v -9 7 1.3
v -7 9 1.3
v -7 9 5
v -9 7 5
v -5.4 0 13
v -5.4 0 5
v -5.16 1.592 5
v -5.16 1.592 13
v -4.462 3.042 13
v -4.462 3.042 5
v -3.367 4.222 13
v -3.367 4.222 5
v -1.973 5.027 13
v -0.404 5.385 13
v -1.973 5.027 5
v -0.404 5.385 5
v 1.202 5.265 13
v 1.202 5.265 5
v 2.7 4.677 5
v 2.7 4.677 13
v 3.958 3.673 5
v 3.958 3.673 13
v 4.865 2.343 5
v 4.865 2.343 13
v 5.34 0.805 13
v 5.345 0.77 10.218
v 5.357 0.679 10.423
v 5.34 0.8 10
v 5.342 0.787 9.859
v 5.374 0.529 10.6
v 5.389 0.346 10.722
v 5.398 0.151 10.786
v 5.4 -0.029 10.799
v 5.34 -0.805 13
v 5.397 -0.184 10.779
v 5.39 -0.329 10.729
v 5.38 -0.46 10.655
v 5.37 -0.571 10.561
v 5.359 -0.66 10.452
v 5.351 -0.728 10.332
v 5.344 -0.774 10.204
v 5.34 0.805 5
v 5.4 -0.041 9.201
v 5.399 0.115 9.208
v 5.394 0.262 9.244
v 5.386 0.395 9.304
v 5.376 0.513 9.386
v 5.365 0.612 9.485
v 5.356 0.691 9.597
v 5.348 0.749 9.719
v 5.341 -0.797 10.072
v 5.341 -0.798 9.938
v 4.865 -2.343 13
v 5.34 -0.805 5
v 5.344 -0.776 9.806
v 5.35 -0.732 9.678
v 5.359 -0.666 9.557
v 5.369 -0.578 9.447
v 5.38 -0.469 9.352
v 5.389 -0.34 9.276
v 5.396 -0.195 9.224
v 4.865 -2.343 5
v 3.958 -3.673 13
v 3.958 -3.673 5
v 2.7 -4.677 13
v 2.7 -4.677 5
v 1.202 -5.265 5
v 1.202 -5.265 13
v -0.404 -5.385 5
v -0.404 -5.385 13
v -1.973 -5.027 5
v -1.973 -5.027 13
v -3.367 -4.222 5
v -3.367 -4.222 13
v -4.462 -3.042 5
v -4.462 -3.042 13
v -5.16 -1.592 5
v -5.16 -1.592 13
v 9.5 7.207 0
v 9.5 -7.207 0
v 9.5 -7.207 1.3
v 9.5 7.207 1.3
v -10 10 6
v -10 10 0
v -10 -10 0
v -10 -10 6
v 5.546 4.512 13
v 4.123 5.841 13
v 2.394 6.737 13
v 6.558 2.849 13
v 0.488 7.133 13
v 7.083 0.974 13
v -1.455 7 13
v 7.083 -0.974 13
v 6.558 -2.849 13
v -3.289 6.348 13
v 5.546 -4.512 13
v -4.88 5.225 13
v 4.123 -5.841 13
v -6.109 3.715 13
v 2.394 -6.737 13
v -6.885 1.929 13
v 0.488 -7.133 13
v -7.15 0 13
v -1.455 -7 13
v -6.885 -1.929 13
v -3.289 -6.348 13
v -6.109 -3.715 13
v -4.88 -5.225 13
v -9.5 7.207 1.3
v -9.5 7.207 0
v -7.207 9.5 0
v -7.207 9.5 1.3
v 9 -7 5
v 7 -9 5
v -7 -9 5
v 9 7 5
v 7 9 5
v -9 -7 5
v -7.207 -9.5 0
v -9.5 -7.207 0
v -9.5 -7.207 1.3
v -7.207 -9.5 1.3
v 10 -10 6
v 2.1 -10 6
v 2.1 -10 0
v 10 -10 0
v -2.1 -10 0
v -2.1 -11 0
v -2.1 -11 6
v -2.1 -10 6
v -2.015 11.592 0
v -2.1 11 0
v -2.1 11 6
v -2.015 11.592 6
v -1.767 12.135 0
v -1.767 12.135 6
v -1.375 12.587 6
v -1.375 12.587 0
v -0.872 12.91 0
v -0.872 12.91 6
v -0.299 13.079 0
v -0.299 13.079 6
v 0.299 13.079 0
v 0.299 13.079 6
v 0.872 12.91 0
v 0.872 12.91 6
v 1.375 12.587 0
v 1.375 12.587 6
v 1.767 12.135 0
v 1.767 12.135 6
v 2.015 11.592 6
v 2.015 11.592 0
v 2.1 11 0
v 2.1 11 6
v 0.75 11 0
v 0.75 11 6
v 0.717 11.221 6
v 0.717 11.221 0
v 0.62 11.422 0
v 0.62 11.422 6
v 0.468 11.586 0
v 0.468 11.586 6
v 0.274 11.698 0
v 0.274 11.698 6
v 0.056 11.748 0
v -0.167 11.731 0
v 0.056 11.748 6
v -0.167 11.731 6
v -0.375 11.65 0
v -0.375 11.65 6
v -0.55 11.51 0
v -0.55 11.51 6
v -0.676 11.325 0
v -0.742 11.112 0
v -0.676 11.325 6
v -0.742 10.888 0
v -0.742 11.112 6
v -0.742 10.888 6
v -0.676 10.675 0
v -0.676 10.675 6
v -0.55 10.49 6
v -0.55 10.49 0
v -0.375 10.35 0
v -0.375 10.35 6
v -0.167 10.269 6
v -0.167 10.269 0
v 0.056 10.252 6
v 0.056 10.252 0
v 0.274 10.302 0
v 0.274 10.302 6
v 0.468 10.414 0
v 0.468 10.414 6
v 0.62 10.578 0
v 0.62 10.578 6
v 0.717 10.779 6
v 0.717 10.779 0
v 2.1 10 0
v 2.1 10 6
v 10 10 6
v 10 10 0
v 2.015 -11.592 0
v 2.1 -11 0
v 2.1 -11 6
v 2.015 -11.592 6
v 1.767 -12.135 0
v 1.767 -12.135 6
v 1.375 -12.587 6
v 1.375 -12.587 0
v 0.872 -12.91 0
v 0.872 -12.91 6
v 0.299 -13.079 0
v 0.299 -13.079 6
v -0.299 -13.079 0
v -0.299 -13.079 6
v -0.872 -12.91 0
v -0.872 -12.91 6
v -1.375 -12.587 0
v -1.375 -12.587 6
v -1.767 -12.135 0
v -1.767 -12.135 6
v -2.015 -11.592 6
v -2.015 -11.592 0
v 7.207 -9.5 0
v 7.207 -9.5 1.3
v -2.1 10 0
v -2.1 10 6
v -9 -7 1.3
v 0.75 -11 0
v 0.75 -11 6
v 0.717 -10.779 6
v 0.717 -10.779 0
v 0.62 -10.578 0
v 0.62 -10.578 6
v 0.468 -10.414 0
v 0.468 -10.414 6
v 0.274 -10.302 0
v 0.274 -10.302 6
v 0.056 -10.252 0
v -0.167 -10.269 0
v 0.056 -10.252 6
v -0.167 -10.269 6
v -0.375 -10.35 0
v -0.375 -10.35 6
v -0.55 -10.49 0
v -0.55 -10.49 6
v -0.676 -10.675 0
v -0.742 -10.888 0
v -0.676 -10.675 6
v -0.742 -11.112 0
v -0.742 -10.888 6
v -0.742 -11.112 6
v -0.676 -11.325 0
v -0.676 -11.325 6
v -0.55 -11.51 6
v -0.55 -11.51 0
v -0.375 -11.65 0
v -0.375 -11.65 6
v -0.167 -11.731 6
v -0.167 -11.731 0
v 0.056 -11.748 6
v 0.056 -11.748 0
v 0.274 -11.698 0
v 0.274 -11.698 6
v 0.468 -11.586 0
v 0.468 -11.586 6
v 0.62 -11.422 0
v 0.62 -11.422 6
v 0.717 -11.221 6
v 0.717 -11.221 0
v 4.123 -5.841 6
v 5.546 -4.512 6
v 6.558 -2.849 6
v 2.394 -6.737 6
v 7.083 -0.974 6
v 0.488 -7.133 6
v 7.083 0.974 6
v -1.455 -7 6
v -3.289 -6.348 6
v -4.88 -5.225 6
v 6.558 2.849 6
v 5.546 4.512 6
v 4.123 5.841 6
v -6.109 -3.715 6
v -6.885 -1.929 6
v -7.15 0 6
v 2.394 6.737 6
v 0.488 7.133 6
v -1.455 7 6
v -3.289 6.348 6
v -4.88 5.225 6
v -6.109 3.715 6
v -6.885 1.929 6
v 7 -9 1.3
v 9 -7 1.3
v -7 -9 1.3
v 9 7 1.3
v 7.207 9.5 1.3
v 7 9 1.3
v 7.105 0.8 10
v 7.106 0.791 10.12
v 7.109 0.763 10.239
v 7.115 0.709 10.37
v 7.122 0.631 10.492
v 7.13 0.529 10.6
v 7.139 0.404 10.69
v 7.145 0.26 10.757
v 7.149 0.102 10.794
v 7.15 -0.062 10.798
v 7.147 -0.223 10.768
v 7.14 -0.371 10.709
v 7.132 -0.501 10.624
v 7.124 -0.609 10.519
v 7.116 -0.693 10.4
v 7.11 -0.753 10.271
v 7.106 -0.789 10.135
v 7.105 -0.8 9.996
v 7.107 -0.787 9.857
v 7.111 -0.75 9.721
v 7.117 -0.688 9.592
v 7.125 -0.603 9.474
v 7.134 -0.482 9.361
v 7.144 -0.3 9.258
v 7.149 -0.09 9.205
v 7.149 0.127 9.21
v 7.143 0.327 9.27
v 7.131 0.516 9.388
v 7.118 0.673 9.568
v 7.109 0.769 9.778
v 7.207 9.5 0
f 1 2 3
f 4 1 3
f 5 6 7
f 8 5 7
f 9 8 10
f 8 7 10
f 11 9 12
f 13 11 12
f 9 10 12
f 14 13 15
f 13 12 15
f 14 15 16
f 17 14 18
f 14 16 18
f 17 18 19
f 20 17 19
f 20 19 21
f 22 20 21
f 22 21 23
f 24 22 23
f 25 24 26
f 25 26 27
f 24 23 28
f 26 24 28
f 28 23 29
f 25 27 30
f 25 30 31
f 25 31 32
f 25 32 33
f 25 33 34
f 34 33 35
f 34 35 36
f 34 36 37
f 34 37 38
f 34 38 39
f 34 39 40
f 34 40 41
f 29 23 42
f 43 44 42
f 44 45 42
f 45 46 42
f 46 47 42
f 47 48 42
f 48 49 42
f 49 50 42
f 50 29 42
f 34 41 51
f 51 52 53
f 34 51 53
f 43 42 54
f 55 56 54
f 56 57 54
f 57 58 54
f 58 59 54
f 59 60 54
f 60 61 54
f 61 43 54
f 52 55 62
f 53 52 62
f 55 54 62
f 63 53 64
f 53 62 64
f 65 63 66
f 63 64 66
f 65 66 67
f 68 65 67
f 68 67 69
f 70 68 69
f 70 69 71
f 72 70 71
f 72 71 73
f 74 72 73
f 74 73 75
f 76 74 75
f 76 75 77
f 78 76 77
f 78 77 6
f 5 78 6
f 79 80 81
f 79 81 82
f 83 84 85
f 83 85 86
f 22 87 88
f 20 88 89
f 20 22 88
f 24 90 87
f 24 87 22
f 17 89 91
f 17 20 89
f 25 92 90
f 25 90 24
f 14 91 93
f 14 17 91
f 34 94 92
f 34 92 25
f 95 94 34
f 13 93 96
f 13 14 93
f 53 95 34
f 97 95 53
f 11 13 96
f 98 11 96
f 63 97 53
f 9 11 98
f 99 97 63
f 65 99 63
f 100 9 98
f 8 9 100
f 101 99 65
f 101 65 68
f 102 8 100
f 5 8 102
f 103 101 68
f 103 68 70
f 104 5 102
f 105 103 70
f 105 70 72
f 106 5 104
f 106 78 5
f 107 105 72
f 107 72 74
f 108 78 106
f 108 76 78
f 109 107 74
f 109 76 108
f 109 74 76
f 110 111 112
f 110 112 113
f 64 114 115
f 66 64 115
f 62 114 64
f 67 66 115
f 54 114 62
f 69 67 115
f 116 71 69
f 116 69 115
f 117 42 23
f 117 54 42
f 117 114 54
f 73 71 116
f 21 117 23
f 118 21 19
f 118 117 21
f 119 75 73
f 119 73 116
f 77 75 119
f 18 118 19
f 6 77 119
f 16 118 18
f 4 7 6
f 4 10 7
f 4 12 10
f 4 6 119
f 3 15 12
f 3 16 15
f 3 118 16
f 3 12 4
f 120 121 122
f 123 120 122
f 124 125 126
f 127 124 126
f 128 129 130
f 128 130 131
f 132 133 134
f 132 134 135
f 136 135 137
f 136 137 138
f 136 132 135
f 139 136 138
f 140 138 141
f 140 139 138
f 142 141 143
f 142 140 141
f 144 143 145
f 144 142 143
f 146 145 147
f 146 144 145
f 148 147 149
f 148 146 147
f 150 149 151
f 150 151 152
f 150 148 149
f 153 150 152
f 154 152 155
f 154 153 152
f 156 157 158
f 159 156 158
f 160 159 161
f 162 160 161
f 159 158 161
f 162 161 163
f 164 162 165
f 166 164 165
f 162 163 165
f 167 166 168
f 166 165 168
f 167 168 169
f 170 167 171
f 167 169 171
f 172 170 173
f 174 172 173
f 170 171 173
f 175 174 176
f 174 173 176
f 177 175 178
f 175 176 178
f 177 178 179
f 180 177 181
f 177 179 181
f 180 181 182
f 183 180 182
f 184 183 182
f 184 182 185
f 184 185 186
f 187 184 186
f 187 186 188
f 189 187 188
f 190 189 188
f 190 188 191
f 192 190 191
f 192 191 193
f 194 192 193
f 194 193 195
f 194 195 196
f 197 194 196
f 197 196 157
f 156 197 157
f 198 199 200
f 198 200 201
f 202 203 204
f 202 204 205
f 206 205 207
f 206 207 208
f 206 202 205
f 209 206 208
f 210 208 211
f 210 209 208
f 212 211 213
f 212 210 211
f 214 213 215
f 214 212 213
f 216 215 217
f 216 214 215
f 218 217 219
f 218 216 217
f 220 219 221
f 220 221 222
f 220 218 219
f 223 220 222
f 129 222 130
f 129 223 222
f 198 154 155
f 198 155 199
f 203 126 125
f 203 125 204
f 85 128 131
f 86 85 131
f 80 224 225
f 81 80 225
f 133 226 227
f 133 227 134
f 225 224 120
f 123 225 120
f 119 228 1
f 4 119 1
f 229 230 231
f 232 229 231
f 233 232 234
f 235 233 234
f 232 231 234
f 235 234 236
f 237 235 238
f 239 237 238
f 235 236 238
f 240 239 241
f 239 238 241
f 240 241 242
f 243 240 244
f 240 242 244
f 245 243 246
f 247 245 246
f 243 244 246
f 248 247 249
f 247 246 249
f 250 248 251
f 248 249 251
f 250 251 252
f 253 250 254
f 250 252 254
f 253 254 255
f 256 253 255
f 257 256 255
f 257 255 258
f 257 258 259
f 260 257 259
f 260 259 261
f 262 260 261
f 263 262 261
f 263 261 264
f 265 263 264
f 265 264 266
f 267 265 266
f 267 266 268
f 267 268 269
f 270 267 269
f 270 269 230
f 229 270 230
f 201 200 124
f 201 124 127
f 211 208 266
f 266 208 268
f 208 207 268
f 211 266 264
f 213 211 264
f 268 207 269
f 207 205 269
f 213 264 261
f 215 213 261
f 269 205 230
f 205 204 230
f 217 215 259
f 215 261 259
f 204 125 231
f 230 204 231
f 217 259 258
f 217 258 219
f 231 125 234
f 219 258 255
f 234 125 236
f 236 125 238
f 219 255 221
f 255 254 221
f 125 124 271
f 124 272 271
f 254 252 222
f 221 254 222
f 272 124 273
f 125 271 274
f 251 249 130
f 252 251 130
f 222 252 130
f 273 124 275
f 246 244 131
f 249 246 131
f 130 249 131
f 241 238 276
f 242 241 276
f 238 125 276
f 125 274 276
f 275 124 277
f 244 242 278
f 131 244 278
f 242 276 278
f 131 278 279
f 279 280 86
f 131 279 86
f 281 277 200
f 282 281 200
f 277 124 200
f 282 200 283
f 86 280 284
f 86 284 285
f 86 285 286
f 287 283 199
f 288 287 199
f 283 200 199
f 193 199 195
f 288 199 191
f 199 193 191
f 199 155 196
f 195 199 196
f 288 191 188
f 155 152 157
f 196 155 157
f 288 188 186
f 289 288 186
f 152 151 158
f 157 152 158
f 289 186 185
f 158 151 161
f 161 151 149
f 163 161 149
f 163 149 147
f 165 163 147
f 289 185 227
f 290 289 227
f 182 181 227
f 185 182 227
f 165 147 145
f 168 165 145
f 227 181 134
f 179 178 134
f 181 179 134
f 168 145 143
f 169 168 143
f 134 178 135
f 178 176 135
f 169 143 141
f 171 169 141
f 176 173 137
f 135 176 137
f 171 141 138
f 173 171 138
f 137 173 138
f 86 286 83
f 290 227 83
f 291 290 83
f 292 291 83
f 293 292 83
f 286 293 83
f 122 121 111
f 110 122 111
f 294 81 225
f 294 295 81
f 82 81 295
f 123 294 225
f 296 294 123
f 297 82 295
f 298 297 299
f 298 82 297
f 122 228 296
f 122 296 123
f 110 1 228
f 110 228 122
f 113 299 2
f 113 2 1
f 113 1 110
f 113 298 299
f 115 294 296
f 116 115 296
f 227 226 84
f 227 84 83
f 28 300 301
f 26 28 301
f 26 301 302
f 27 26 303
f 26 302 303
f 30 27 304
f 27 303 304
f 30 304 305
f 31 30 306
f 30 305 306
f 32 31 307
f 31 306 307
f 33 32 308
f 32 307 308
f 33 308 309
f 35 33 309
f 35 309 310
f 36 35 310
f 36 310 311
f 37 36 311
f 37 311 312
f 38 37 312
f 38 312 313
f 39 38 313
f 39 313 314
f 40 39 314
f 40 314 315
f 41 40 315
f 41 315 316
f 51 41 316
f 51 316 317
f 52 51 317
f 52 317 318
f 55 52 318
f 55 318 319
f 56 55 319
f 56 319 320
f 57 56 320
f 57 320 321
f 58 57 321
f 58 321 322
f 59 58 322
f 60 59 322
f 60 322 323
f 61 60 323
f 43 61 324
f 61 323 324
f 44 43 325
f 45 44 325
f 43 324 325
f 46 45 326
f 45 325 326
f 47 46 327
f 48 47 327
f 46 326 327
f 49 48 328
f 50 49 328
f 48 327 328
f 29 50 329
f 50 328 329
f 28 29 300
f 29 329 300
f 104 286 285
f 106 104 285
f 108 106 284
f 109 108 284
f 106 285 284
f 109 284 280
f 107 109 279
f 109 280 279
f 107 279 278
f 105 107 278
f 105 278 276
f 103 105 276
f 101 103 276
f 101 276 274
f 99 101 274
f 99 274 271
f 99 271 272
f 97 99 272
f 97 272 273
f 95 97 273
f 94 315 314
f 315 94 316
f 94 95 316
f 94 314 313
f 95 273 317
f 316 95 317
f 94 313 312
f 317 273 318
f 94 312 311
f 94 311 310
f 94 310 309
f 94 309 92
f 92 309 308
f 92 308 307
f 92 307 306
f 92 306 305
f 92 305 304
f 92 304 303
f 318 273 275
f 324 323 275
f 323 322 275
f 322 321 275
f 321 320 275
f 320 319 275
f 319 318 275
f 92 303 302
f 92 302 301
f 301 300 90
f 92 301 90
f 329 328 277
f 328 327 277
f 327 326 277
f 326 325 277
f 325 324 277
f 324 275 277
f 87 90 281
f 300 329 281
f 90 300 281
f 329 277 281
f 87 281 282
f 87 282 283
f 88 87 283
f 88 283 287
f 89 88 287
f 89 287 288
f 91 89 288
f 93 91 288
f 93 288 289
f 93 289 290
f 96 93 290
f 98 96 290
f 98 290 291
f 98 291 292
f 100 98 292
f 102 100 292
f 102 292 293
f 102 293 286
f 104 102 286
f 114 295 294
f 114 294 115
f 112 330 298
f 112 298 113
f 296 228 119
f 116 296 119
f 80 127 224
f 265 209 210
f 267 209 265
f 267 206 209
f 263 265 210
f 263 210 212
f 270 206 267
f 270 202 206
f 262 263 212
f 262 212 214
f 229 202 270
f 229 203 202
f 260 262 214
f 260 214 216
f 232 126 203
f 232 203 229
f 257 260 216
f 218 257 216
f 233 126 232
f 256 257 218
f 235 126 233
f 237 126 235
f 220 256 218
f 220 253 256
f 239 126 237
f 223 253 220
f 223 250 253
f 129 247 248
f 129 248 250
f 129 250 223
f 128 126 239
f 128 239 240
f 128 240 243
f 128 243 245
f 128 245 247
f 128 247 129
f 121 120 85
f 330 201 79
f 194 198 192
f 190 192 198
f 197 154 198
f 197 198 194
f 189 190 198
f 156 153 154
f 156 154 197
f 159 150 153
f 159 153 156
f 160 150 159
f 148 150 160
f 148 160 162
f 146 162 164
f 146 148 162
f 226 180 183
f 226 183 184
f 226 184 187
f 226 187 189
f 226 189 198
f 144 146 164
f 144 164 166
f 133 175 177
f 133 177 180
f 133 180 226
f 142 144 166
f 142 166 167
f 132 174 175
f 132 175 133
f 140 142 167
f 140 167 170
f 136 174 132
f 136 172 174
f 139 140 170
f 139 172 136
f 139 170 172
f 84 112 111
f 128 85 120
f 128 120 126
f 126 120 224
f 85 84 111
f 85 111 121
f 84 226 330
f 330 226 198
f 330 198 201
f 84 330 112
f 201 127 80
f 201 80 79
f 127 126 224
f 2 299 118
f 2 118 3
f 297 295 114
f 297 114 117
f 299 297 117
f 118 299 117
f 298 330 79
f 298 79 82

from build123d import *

# Parameters (mm, degrees)
AUFSATZ_LINEAR_AUSTRAGEN1_DEPTH        = 6
SKIZZE2_W                              = 6
SKIZZE2_H                              = 20
AUFSATZ_LINEAR_AUSTRAGEN2_DEPTH        = 7.9
SKIZZE3_W                              = 6
SKIZZE3_H                              = 20
AUFSATZ_LINEAR_AUSTRAGEN3_DEPTH        = 7.9
SKIZZE4_R                              = 7.15
AUFSATZ_LINEAR_AUSTRAGEN4_DEPTH        = 7
SKIZZE5_W                              = 19
SKIZZE5_H                              = 19
SCHNITT_LINEAR_AUSTRAGEN1_DEPTH        = 1.3
SKIZZE6_W                              = 18
SKIZZE6_H                              = 18
SCHNITT_LINEAR_AUSTRAGEN2_DEPTH        = 3.7
F_1_5_1_5_DURCHMESSER_BOHRUNG1_D       = 1.5
F_1_5_1_5_DURCHMESSER_BOHRUNG1_DEPTH   = 13
F_10_8_10_8_DURCHMESSER_BOHRUNG1_D     = 10.8
F_10_8_10_8_DURCHMESSER_BOHRUNG1_DEPTH = 13
F_1_6_1_6_DURCHMESSER_BOHRUNG1_REACH   = 25.785
F_1_6_1_6_DURCHMESSER_BOHRUNG1_BORE_R  = 0.8
FASE1_SIZE                             = 2
FASE2_SIZE                             = 2.292893219


with BuildPart() as part:
    # Skizze1 → Aufsatz-Linear austragen1 (new body)
    with BuildSketch(Plane(origin=(0, 0, 0), x_dir=(-1, 0, 0), z_dir=(0, 0, -1))):
        with BuildLine():
            Line((2.1, -11), (2.1, 11))
            ThreePointArc((2.1, 11), (0, 13.1), (-2.1, 11))
            Line((-2.1, 11), (-2.1, -11))
            ThreePointArc((-2.1, -11), (0, -13.1), (2.1, -11))
        make_face()
    extrude(amount=-AUFSATZ_LINEAR_AUSTRAGEN1_DEPTH)

    # Skizze2 → Aufsatz-Linear austragen2 (add)
    with BuildSketch(Plane.ZY.offset(2.1)):
        with Locations((3, 0)):
            Rectangle(SKIZZE2_W, SKIZZE2_H)
    extrude(amount=AUFSATZ_LINEAR_AUSTRAGEN2_DEPTH)

    # Skizze3 → Aufsatz-Linear austragen3 (add)
    with BuildSketch(Plane(origin=(2.1, 0, 0), x_dir=(0, 0, -1), z_dir=(1, 0, 0))):
        with Locations((-3, 0)):
            Rectangle(SKIZZE3_W, SKIZZE3_H)
    extrude(amount=AUFSATZ_LINEAR_AUSTRAGEN3_DEPTH)

    # Skizze4 → Aufsatz-Linear austragen4 (add)
    with BuildSketch(Plane.XY.offset(6)):
        with Locations(Location((0, 0, 0), (0, 0, 180))):
            Circle(SKIZZE4_R)
    extrude(amount=AUFSATZ_LINEAR_AUSTRAGEN4_DEPTH)

    # Skizze5 → Schnitt-Linear austragen1 (cut)
    with BuildSketch(Plane(origin=(0, 0, 0), x_dir=(-1, 0, 0), z_dir=(0, 0, -1))):
        Rectangle(SKIZZE5_W, SKIZZE5_H)
    extrude(amount=-SCHNITT_LINEAR_AUSTRAGEN1_DEPTH, mode=Mode.SUBTRACT)

    # Skizze6 → Schnitt-Linear austragen2 (cut)
    with BuildSketch(Plane(origin=(0, 0, 1.3), x_dir=(-1, 0, 0), z_dir=(0, 0, -1))):
        Rectangle(SKIZZE6_W, SKIZZE6_H)
    extrude(amount=-SCHNITT_LINEAR_AUSTRAGEN2_DEPTH, mode=Mode.SUBTRACT)

    # Ø1.5 (1.5) Durchmesser Bohrung1
    with Locations(Plane(origin=(0, 0, 0), x_dir=(-1, 0, 0), z_dir=(0, 0, -1))):
        with Locations((0, -11), (0, 11)):
            Hole(F_1_5_1_5_DURCHMESSER_BOHRUNG1_D / 2, depth=F_1_5_1_5_DURCHMESSER_BOHRUNG1_DEPTH)

    # Ø10.8 (10.8) Durchmesser Bohrung1
    with Locations(Plane.XY.offset(13)):
        with Locations((0, 0)):
            Hole(F_10_8_10_8_DURCHMESSER_BOHRUNG1_D / 2, depth=F_10_8_10_8_DURCHMESSER_BOHRUNG1_DEPTH)

    # Ø1.6 (1.6) Durchmesser Bohrung1 bore (on position points) → Ø1.6 (1.6) Durchmesser Bohrung1 (cut, up to next)
    with BuildSketch(Plane(origin=(7.15, 0, 10), x_dir=(0, 1, 0), z_dir=(1, 0, 0)), mode=Mode.PRIVATE) as f_1_6_1_6_durchmesser_bohrung1_sk1:
        Circle(F_1_6_1_6_DURCHMESSER_BOHRUNG1_BORE_R)
    f_1_6_1_6_durchmesser_bohrung1_tool1 = extrude(f_1_6_1_6_durchmesser_bohrung1_sk1.sketch, amount=-F_1_6_1_6_DURCHMESSER_BOHRUNG1_REACH, mode=Mode.PRIVATE) & part.part
    add(f_1_6_1_6_durchmesser_bohrung1_tool1.solids().sort_by_distance((7.15, 0, 10))[0], mode=Mode.SUBTRACT)

    # Fase1
    fase1_edges = [part.edges().sort_by_distance(p)[0] for p in [
        (-9, -9, 3.15),
        (9, -9, 3.15),
        (9, 9, 3.15),
        (-9, 9, 3.15),
    ]]
    chamfer(fase1_edges, length=FASE1_SIZE)

    # Fase2
    fase2_edges = [part.edges().sort_by_distance(p)[0] for p in [
        (9.5, 9.5, 0.65),
        (-9.5, 9.5, 0.65),
        (-9.5, -9.5, 0.65),
        (9.5, -9.5, 0.65),
    ]]
    chamfer(fase2_edges, length=FASE2_SIZE)


solid = part.part
